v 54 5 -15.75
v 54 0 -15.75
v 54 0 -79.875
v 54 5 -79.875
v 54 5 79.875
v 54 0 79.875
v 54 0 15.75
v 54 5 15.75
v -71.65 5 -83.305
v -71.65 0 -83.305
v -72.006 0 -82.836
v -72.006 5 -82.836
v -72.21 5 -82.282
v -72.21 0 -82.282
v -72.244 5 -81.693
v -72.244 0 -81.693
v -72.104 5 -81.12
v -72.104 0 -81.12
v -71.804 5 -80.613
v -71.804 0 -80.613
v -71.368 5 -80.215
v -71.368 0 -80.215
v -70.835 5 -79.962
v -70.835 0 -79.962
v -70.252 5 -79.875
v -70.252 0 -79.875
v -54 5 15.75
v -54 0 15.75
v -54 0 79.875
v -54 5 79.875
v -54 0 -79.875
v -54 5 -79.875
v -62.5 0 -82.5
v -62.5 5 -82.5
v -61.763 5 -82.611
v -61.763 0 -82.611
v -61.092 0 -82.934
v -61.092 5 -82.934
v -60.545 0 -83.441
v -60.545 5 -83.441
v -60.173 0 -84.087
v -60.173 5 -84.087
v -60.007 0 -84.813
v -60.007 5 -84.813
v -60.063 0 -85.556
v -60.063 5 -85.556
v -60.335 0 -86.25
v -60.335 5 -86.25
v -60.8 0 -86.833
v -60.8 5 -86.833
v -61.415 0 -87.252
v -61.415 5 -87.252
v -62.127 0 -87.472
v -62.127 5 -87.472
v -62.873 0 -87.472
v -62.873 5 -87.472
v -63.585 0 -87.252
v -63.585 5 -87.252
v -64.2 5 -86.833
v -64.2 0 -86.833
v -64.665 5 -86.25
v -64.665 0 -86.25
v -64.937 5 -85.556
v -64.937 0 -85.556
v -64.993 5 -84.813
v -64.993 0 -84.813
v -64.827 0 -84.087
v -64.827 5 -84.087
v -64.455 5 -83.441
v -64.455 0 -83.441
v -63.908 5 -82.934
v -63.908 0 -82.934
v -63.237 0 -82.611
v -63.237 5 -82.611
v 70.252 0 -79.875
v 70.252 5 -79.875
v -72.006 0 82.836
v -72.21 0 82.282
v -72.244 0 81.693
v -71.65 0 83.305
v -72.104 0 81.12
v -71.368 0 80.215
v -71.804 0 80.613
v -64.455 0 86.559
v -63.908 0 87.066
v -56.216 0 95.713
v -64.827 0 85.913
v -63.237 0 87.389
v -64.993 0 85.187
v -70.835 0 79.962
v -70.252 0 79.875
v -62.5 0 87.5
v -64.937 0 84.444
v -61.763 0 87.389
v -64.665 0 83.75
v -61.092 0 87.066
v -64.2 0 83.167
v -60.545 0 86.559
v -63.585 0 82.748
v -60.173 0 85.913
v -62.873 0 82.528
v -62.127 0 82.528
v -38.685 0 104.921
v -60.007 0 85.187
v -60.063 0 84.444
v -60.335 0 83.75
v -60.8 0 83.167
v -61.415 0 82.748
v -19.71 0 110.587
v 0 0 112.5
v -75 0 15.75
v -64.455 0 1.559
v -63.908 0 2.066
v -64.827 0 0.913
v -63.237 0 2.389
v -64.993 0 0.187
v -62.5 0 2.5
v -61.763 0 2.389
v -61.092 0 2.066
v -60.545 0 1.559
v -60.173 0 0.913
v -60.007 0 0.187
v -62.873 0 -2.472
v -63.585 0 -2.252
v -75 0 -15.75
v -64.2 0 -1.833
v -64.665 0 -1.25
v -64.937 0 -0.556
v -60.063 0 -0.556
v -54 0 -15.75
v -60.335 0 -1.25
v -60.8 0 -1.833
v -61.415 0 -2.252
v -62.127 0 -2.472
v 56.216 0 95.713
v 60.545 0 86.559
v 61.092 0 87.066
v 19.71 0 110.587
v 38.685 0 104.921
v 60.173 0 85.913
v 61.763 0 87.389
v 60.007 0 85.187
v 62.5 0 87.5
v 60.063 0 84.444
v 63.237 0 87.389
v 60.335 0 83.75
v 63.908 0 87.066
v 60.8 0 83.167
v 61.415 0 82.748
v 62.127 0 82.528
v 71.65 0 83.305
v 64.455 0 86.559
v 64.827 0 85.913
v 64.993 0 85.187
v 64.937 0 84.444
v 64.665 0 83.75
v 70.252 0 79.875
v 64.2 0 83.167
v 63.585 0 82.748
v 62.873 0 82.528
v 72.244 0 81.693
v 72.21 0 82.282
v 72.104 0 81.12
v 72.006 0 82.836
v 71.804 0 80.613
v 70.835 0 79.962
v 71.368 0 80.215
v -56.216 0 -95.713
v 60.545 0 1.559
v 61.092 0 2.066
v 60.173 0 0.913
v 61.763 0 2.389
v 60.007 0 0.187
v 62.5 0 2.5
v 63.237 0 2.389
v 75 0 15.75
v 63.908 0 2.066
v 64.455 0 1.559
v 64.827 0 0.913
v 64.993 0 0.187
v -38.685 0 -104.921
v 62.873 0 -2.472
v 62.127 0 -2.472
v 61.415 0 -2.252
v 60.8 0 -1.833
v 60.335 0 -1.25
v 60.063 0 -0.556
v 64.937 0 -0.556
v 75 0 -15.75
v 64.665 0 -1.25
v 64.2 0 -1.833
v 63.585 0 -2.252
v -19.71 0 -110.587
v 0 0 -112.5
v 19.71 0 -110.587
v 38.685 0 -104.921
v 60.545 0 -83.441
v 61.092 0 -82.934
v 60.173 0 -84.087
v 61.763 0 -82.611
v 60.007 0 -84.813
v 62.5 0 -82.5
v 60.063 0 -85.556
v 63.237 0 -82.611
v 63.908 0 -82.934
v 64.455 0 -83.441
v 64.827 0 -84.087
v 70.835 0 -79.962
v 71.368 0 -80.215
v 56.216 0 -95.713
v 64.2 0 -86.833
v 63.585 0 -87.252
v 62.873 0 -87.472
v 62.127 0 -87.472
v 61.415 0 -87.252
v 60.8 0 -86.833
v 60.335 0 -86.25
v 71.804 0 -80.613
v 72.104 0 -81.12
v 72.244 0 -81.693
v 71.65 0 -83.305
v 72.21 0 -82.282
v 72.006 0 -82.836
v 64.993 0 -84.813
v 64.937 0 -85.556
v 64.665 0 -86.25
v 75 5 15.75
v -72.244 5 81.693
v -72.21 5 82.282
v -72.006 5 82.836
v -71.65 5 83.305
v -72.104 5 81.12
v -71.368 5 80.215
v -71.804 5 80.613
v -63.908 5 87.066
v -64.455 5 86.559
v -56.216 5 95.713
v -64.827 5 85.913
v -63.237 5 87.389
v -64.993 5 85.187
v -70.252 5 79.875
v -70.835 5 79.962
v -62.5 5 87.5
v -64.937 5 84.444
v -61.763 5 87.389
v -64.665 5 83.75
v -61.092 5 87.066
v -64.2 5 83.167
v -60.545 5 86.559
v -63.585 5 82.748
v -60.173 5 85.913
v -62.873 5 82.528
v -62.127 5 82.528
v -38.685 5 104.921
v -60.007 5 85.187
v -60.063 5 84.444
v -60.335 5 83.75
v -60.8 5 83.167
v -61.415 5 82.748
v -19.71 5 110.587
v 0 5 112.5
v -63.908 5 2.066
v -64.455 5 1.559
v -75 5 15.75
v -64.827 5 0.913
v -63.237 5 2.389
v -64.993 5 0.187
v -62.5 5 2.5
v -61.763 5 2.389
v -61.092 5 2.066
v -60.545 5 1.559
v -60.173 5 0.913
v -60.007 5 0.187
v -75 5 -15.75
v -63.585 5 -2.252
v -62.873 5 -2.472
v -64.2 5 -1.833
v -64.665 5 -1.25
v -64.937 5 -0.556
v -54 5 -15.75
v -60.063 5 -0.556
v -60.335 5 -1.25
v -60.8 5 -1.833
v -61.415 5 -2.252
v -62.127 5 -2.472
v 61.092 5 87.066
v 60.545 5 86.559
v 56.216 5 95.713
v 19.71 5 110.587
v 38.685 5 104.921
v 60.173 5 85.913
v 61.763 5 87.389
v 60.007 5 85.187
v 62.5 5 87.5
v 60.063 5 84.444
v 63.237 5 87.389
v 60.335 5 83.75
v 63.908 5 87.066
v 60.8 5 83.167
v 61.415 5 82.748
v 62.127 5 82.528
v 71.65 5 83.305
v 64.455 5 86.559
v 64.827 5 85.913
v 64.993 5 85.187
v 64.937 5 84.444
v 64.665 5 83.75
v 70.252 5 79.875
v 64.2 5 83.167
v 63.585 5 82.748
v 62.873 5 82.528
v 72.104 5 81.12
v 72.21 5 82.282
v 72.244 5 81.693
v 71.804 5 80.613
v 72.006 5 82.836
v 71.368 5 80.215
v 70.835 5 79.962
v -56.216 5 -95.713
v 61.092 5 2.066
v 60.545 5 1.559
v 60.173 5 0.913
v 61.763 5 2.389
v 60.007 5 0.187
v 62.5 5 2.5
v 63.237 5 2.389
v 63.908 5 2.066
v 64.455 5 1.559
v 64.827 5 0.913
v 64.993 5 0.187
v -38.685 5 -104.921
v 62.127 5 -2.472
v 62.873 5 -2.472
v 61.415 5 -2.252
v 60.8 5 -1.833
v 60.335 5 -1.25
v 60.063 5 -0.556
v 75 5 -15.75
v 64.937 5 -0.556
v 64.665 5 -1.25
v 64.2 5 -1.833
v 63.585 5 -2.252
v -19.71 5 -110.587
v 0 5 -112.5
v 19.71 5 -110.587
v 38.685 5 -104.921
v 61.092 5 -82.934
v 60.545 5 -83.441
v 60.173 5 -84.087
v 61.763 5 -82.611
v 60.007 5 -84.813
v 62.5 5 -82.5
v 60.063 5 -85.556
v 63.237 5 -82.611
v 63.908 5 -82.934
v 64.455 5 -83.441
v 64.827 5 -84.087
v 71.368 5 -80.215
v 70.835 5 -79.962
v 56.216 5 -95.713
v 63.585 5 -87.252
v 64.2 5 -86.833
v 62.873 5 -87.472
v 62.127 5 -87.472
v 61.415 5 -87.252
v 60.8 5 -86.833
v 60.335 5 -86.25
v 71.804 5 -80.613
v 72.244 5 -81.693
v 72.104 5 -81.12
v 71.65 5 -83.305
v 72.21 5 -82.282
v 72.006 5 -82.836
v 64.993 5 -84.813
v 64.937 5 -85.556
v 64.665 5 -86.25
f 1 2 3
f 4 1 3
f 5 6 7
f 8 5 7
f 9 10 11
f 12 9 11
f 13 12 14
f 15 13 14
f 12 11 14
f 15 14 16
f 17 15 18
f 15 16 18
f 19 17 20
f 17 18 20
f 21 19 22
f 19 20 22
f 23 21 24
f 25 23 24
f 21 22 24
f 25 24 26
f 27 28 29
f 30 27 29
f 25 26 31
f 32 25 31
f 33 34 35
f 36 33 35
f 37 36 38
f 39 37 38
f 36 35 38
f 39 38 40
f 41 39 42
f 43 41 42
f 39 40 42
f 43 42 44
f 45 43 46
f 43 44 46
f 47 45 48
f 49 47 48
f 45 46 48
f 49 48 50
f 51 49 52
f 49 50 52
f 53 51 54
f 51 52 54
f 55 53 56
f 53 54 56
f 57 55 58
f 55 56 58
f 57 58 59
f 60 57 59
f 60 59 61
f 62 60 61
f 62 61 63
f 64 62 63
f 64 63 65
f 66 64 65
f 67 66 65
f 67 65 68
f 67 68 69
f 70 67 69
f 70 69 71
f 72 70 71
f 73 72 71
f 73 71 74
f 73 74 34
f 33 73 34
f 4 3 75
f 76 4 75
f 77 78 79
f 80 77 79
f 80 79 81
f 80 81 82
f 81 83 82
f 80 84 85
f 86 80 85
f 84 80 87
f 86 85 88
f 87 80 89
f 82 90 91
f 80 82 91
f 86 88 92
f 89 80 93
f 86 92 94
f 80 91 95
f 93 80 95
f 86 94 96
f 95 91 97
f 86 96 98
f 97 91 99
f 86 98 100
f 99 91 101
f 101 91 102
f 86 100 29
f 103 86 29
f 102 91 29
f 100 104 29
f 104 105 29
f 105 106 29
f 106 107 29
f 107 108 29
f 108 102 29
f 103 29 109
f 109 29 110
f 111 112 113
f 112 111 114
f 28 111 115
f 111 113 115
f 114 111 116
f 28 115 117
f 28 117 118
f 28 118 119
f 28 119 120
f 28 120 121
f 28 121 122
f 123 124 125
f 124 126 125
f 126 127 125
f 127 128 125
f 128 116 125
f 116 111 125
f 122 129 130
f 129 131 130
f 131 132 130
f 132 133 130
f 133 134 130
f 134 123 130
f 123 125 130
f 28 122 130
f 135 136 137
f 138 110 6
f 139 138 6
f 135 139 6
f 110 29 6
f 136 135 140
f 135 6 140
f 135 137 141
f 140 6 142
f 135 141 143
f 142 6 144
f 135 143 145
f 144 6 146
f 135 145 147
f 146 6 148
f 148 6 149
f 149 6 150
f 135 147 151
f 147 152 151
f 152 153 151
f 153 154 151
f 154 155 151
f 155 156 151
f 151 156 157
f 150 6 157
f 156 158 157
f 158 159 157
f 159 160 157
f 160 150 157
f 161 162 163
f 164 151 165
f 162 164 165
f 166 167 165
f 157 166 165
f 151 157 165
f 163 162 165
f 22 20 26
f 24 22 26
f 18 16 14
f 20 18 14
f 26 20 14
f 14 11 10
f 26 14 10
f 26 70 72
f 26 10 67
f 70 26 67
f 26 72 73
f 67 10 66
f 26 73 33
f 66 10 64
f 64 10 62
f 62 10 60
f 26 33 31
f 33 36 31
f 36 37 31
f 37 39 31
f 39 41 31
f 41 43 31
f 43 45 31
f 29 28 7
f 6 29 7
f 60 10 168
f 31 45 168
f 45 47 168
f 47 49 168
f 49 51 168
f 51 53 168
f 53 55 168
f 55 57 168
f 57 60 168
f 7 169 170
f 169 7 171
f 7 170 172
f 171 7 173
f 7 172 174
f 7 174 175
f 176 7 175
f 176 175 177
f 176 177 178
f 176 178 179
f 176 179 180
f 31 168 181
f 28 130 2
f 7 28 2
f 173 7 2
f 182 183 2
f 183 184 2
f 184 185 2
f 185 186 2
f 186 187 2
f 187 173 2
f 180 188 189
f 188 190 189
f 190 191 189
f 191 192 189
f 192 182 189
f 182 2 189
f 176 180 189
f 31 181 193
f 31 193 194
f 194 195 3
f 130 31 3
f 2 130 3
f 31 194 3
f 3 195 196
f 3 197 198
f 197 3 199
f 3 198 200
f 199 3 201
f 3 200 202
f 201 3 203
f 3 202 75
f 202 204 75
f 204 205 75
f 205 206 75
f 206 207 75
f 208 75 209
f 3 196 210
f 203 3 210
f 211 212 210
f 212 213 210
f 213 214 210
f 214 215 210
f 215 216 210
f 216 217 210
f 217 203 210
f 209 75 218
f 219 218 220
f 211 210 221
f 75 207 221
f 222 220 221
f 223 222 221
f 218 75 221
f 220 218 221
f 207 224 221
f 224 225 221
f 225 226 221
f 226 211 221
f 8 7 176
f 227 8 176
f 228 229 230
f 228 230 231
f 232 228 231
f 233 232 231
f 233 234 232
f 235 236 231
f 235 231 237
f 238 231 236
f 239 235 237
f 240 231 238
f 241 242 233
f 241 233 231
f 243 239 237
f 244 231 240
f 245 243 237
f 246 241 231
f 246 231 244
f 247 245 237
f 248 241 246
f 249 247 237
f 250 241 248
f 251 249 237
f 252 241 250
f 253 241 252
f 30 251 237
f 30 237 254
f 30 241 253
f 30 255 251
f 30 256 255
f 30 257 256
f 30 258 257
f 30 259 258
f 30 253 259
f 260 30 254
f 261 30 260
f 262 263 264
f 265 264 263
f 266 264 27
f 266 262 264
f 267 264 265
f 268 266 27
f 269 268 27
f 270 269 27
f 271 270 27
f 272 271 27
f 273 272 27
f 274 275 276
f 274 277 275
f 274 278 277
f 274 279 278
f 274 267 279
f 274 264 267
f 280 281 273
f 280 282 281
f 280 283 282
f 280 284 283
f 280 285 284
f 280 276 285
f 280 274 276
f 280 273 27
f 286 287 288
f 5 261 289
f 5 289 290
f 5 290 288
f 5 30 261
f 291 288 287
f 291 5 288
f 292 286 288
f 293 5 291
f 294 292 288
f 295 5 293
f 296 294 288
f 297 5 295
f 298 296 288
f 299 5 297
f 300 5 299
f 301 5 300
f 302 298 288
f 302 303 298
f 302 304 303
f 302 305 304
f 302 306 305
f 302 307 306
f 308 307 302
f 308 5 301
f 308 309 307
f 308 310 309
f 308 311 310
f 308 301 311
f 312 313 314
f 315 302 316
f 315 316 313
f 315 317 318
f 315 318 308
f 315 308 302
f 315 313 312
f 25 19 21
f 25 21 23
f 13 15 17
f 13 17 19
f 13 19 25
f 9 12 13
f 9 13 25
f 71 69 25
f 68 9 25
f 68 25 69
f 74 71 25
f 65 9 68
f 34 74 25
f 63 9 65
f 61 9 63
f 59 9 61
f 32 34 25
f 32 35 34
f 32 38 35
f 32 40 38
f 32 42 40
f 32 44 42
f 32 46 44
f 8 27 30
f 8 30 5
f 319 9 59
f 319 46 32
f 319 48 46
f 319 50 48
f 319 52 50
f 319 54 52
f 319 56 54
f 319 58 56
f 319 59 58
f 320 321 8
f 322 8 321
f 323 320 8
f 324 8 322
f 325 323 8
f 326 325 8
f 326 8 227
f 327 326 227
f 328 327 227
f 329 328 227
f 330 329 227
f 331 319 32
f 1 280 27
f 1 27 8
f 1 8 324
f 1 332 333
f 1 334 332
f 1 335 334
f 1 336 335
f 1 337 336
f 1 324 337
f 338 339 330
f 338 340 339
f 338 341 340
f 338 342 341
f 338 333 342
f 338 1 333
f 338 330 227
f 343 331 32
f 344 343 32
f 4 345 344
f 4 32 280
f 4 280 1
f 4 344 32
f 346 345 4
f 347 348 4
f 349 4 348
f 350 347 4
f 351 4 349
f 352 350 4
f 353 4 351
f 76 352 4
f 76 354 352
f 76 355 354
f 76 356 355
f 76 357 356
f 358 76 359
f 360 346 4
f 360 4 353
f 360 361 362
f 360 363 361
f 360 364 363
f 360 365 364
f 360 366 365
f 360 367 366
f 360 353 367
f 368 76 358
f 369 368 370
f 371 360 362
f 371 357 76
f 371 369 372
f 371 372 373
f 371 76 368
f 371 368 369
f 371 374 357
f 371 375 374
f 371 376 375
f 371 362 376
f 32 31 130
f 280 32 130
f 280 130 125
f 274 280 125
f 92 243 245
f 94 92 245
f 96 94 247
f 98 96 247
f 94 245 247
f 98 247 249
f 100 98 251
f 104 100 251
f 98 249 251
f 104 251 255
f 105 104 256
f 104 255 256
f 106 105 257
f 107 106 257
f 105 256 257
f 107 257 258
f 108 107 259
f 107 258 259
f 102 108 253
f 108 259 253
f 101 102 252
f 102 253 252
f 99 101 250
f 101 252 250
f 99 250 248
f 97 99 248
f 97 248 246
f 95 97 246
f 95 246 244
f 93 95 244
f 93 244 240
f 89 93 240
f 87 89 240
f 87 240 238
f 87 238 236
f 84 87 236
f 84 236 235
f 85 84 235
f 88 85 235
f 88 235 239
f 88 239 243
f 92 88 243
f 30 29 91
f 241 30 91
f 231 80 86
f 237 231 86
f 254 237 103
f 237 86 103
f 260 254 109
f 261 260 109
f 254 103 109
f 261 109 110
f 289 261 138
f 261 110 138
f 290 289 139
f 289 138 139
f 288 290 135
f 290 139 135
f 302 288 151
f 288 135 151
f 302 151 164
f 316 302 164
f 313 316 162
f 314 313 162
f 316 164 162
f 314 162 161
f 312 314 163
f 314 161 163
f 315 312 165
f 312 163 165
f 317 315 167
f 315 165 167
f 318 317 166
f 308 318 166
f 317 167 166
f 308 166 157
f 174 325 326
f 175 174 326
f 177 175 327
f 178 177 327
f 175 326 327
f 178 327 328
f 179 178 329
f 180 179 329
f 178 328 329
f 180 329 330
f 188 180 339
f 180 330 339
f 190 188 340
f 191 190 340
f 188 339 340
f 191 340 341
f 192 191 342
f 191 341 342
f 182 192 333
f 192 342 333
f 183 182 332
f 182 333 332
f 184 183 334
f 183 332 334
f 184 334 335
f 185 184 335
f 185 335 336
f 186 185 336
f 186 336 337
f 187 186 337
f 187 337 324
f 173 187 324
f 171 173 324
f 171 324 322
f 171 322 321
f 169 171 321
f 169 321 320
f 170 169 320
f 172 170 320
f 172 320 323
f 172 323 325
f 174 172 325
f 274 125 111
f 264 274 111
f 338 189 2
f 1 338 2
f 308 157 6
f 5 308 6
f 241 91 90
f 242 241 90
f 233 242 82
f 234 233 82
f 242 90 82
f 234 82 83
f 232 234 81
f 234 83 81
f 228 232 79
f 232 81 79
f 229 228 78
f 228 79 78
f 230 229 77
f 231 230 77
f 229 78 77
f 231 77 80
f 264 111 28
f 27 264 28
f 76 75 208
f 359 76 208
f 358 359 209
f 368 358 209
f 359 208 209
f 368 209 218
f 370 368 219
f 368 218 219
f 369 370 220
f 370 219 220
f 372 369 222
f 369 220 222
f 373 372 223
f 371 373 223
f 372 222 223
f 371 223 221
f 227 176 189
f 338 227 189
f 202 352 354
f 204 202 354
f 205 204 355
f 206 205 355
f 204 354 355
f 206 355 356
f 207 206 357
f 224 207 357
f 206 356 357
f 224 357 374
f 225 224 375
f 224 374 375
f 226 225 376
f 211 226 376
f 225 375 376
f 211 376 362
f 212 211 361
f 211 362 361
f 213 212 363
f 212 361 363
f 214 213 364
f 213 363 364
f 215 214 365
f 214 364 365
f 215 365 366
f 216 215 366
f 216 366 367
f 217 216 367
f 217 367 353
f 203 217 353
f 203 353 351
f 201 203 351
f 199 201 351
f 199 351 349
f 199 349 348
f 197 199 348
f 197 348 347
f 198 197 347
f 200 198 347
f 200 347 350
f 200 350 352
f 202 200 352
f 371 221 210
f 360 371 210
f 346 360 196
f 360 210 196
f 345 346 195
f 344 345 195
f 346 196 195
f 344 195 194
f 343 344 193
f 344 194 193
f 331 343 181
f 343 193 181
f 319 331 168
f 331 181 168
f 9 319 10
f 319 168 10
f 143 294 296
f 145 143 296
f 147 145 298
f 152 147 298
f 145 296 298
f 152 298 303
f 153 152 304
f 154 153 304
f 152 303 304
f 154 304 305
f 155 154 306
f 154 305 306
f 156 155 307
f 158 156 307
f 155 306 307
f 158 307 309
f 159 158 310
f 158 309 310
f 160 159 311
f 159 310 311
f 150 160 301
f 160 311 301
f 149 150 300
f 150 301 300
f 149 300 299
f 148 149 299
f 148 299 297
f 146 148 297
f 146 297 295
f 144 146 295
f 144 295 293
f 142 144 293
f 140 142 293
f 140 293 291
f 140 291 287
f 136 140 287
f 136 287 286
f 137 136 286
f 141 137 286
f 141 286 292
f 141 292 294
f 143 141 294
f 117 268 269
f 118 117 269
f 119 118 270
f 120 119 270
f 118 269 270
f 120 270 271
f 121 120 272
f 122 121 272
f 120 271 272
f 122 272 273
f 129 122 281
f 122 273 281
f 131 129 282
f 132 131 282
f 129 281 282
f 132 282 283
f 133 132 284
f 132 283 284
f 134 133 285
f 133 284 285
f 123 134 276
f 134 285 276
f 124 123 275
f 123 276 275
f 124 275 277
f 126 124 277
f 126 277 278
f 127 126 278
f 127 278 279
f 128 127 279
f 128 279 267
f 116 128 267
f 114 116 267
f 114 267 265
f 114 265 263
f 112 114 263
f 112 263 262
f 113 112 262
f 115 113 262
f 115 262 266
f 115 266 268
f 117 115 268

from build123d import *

# Parameters (mm, degrees)
BOSS_EXTRUDE1_DEPTH = 5
SKETCH2_R           = 2.5
CUT_EXTRUDE1_DEPTH  = 136.300591277


with BuildPart() as part:
    # Sketch1 → Boss-Extrude1 (new body)
    with BuildSketch(Plane(origin=(0, 0, 0), x_dir=(1, 0, 0), z_dir=(0, 1, 0))):
        with BuildLine():
            Line((-75, 15.75), (-75, -15.75))
            Line((-75, -15.75), (-54, -15.75))
            Line((-54, -15.75), (-54, -79.875))
            Line((-54, -79.875), (-70.25200942, -79.875))
            ThreePointArc((-70.25200942, -79.875), (-72.104159031, -81.120320055), (-71.649789587, -83.305458181))
            ThreePointArc((-71.649789587, -83.305458181), (0, -112.5), (71.649789587, -83.305458181))
            ThreePointArc((71.649789587, -83.305458181), (72.104159031, -81.120320055), (70.25200942, -79.875))
            Line((70.25200942, -79.875), (54, -79.875))
            Line((54, -79.875), (54, -15.75))
            Line((54, -15.75), (75, -15.75))
            Line((75, -15.75), (75, 0))
            Line((75, 0), (75, 15.75))
            Line((75, 15.75), (54, 15.75))
            Line((54, 15.75), (54, 79.875))
            Line((54, 79.875), (70.25200942, 79.875))
            ThreePointArc((70.25200942, 79.875), (72.104159031, 81.120320055), (71.649789587, 83.305458181))
            ThreePointArc((71.649789587, 83.305458181), (0, 112.5), (-71.649789587, 83.305458181))
            ThreePointArc((-71.649789587, 83.305458181), (-72.104159031, 81.120320055), (-70.25200942, 79.875))
            Line((-70.25200942, 79.875), (-54, 79.875))
            Line((-54, 79.875), (-54, 15.75))
            Line((-54, 15.75), (-75, 15.75))
        make_face()
    extrude(amount=BOSS_EXTRUDE1_DEPTH)

    # Sketch2 → Cut-Extrude1 (cut, through all)
    with BuildSketch(Plane(origin=(0, 5, 0), x_dir=(1, 0, 0), z_dir=(0, 1, 0))):
        with Locations(Location((-62.5, 85, 0), (0, 0, 270))):
            Circle(SKETCH2_R)
        with Locations(Location((62.5, 85, 0), (0, 0, 270))):
            Circle(SKETCH2_R)
        with Locations(Location((62.5, 0, 0), (0, 0, 270))):
            Circle(SKETCH2_R)
        with Locations(Location((62.5, -85, 0), (0, 0, 270))):
            Circle(SKETCH2_R)
        with Locations(Location((-62.5, 0, 0), (0, 0, 270))):
            Circle(SKETCH2_R)
        with Locations(Location((-62.5, -85, 0), (0, 0, 270))):
            Circle(SKETCH2_R)
    extrude(amount=-CUT_EXTRUDE1_DEPTH, mode=Mode.SUBTRACT)


solid = part.part
